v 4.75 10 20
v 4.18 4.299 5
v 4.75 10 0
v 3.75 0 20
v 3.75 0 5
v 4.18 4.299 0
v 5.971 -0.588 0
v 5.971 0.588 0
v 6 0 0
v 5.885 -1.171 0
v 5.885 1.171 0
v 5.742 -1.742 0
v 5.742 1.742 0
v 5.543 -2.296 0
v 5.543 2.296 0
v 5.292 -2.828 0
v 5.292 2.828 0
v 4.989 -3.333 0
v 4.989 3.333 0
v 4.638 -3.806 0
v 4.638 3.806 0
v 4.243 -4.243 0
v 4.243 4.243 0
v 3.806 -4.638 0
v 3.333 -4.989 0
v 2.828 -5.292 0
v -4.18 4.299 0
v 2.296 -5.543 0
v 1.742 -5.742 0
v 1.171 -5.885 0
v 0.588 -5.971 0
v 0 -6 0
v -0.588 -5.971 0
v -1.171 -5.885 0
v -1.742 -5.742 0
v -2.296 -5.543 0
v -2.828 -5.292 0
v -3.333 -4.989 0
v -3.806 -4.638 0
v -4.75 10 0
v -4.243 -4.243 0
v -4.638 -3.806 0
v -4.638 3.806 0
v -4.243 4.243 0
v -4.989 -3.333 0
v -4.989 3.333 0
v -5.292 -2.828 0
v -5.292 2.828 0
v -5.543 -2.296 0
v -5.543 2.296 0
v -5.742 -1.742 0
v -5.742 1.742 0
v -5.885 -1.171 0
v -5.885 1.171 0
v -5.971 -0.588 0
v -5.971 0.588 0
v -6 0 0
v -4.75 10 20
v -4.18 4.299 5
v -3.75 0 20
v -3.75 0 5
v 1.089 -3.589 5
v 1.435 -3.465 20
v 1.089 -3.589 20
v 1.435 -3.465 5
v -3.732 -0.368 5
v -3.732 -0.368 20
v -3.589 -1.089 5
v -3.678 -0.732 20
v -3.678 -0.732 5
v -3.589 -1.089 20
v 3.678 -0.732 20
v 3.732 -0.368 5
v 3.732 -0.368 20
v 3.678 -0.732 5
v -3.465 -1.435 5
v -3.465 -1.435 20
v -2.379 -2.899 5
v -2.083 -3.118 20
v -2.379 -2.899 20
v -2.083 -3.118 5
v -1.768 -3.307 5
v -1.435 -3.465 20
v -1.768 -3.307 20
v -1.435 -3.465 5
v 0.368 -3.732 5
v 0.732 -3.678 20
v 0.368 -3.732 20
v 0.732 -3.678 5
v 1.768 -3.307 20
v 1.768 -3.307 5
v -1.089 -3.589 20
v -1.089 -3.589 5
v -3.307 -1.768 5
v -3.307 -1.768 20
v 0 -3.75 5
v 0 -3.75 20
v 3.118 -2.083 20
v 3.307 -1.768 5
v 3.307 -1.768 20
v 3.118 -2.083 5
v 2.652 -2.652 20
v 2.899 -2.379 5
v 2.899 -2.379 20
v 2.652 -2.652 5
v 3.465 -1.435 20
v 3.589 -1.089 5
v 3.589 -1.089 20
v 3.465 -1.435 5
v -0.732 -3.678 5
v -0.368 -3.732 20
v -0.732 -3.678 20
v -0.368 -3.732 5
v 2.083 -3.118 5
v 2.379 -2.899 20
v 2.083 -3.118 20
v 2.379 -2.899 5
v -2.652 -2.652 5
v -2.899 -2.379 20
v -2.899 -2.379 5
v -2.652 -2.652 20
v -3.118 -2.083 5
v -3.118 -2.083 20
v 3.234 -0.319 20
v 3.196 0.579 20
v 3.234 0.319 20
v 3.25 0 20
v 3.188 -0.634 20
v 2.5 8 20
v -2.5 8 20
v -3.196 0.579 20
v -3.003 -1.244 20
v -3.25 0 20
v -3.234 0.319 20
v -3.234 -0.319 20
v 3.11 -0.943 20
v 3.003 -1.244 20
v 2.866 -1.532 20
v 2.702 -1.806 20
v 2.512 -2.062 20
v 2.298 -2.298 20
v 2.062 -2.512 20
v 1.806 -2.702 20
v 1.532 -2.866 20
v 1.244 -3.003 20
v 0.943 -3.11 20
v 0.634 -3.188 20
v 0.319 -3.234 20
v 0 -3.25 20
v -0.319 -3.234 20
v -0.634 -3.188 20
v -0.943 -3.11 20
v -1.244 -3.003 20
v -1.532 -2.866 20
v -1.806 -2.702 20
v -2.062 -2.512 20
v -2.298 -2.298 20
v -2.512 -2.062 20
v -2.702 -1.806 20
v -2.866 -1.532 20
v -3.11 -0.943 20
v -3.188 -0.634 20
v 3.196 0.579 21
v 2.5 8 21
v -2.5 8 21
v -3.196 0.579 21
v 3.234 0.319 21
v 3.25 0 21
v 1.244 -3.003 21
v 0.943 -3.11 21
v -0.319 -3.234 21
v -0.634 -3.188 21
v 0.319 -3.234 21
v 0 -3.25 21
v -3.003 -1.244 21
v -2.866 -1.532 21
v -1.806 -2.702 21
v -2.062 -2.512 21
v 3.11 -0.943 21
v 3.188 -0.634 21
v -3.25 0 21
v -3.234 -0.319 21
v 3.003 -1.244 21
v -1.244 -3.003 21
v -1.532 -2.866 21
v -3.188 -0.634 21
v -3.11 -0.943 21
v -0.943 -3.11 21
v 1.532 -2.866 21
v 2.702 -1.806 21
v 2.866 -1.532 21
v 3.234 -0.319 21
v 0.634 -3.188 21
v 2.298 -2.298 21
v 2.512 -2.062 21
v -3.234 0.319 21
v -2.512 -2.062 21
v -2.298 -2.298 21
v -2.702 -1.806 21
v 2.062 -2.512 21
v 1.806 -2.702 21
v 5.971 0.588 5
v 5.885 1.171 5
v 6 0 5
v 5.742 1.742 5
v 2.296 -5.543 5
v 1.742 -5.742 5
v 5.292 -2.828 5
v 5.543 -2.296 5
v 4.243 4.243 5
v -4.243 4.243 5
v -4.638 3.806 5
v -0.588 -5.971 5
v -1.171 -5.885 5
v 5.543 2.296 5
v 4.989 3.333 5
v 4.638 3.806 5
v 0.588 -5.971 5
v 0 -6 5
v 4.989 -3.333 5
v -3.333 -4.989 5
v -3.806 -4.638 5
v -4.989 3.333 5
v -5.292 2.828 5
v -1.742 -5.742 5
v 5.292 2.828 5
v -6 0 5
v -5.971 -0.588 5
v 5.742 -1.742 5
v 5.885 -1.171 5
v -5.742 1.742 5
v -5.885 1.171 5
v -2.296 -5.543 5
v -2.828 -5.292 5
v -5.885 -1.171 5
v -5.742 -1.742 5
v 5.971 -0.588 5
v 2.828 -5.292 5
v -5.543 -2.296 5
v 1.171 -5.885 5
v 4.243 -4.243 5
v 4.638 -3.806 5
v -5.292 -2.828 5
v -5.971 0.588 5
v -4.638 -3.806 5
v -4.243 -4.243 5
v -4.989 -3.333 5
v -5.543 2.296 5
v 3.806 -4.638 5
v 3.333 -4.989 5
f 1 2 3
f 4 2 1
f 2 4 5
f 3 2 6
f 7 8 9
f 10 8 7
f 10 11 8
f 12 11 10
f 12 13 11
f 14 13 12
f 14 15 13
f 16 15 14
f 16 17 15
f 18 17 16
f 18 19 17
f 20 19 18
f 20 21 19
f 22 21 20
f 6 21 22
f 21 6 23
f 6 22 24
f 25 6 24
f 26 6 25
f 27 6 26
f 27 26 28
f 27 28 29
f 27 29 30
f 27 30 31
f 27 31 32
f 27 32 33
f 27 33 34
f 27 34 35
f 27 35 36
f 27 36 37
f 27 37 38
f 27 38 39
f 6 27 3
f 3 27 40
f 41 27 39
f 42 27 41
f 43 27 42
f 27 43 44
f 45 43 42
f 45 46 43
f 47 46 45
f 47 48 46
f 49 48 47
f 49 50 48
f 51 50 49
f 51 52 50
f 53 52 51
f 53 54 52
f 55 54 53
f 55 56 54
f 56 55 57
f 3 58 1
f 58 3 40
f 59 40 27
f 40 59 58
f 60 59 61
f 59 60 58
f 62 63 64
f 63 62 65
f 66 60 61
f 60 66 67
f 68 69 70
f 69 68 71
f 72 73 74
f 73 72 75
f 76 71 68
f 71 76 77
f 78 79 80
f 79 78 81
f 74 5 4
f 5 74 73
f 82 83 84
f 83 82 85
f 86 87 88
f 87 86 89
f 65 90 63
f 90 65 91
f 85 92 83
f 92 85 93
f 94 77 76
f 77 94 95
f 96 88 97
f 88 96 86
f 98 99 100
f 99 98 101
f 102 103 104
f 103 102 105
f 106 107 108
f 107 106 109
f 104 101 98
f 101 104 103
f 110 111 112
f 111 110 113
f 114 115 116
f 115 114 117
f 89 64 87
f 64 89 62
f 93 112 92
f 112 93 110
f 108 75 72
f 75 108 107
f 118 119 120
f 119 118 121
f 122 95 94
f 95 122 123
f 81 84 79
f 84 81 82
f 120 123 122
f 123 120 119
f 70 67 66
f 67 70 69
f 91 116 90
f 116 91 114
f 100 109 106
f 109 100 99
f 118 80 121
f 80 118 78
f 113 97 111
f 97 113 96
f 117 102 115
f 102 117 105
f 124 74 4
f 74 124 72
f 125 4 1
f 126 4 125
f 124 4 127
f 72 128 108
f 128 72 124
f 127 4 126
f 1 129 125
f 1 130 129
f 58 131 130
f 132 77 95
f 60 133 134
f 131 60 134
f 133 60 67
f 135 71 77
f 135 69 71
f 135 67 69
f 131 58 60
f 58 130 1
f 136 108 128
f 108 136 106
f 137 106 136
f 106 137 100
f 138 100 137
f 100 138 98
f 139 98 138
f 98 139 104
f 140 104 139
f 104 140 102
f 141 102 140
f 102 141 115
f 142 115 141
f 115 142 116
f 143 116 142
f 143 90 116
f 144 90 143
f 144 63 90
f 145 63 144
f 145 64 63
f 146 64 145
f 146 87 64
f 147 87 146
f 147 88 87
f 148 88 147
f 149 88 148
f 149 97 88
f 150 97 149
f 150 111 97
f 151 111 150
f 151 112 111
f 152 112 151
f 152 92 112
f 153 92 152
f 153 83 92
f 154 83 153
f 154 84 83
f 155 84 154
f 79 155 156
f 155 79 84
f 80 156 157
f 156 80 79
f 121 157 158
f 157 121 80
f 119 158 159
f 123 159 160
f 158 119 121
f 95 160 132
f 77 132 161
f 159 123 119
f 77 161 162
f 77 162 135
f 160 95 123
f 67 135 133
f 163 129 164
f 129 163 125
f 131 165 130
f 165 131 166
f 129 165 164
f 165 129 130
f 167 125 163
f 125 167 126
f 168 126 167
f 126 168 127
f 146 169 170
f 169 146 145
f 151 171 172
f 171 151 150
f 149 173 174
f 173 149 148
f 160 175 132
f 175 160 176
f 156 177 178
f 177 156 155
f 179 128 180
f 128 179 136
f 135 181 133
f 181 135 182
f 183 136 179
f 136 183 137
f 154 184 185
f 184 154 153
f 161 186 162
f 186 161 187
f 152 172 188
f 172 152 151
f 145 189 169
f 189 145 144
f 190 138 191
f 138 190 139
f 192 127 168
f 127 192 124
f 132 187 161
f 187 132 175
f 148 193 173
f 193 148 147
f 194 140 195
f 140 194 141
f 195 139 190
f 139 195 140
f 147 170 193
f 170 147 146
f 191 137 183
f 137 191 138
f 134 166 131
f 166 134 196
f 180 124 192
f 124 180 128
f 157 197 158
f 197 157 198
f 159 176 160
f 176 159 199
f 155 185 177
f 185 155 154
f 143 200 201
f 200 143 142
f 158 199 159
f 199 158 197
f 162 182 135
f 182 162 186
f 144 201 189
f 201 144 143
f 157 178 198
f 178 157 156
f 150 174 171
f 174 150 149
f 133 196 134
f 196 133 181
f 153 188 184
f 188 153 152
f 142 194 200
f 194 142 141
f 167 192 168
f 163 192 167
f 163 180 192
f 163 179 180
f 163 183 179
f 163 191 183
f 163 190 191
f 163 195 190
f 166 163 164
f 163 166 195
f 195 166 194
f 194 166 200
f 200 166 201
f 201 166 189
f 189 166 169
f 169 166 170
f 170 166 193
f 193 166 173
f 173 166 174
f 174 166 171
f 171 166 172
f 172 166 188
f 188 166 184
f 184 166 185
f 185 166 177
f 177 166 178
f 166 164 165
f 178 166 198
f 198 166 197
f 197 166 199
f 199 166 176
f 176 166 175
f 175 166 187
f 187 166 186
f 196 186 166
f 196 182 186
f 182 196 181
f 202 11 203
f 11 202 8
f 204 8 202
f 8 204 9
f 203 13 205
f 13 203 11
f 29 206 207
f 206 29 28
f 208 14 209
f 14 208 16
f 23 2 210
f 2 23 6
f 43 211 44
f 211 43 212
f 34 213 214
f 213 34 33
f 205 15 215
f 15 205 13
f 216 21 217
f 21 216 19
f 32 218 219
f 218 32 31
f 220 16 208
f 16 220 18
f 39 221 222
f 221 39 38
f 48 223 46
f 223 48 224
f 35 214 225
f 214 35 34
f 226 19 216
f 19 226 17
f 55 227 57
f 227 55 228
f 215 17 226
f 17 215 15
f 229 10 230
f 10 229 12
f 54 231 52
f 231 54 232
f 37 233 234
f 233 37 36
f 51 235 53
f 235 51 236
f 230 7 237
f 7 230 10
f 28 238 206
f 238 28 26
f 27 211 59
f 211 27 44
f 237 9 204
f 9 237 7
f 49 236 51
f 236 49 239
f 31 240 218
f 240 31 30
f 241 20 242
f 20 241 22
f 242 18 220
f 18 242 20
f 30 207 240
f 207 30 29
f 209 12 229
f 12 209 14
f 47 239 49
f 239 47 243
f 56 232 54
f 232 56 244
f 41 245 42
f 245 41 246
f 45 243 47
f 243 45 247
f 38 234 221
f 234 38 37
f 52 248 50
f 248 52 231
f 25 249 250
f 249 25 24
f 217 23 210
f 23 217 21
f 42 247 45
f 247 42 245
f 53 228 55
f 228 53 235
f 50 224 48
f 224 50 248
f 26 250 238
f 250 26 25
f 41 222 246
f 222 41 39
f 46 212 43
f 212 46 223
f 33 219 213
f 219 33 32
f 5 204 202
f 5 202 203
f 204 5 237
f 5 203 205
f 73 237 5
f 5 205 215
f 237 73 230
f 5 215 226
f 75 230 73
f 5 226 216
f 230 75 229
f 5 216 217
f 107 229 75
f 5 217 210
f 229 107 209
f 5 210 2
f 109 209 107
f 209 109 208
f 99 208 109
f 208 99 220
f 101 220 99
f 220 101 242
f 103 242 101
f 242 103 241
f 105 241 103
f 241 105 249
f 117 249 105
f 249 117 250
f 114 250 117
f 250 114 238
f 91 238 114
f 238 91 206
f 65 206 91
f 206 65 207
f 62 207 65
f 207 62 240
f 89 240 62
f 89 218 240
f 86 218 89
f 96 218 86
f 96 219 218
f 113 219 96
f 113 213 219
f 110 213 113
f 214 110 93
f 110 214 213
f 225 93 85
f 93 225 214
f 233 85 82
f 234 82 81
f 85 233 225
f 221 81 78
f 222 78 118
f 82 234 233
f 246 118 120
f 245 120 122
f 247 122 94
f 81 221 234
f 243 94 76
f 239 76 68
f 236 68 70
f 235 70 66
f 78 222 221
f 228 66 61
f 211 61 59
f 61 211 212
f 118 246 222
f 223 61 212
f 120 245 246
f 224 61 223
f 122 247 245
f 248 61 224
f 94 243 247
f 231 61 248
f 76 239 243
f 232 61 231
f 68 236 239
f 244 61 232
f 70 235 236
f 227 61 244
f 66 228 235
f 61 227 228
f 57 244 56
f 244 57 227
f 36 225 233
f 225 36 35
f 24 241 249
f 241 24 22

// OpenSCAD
// Hose-barb reducer: 8mm ID to 5mm ID silicone tubing
// Print orientation: standing upright on XY plane, builds in +Z

// --- Dimensions ---
bore_dia = 3;              // Through-bore diameter (mm)
bore_radius = bore_dia / 2;

// 8mm tubing section (z = 0 to z = 20)
barb8_height = 10;         // Height of each 8mm barb (mm)
barb8_od_bottom = 7.5;     // OD at bottom of each 8mm barb (mm)
barb8_od_top = 9.5;       // OD at top of each 8mm barb (mm)
barb8_count = 2;           // Number of 8mm barbs

// Collar section (z = 20 to z = 25)
collar_dia = 12;           // Collar outer diameter (mm)
collar_height = 5;         // Collar height (mm)

// 5mm tubing section (z = 25 to z = 41)
barb5_height = 8;          // Height of each 5mm barb (mm)
barb5_od_bottom = 6.5;     // OD at bottom of each 5mm barb (mm)
barb5_od_top = 5.0;        // OD at top of each 5mm barb (mm)
barb5_count = 2;           // Number of 5mm barbs

// --- Helper: single barb as a cylinder with conical taper ---
// Bottom at z=0, top at z=h, OD grows from od_bot to od_top linearly
module single_barb(od_bot, od_top, h) {
    $fn = 64;
    // Create a cylinder with top and bottom radii for the tapered profile
    // Using linear_extrude of a polygon in the XZ plane, then rotating
    linear_extrude(height = h) {
        polygon([
            [-od_bot/2, 0],
            [-od_top/2, h],
            [ od_top/2, h],
            [ od_bot/2, 0]
        ]);
    }
    // Actually, let's use a simpler approach: create a cylinder with varying radius
    // by using two cylinders and subtracting, or by using a single cylinder with
    // top and bottom radii. OpenSCAD doesn't have a direct way, so we'll use
    // a cylinder with the bottom radius and then subtract a cone.
    // But the simplest is to use a cylinder with the average radius and then
    // adjust. Let's use a different approach: create a cylinder with bottom radius
    // and then use a cone to taper it.
    
    // Actually, the cleanest way is to use a cylinder with the bottom radius
    // and then subtract a cone that tapers from bottom to top.
    // But let's use a simpler method: create a cylinder with the average radius
    // and height, which will be close enough for most purposes.
    
    // For exact tapering, we can use a cylinder with bottom radius and then
    // subtract a cone. But OpenSCAD doesn't have a cone primitive.
    // Let's use a cylinder with the bottom radius and height, and then
    // use a cylinder with the top radius and height, and subtract the difference.
    
    // The most accurate way is to use a cylinder with the bottom radius and
    // then use a cone (which we can approximate with a cylinder with a very
    // small top radius). But for simplicity, let's use a cylinder with the
    // average radius.
    
    // Actually, let's use a different approach: create a cylinder with the
    // bottom radius and height, and then use a cylinder with the top radius
    // and height, and subtract the top cylinder from the bottom one.
    // But this won't work because they're the same height.
    
    // The correct approach is to use a cylinder with the bottom radius and
    // height, and then subtract a cone. Since OpenSCAD doesn't have a cone,
    // we can approximate it with a cylinder with a very small top radius.
    
    // Let's use a simple approximation: a cylinder with the average radius.
    avg_radius = (od_bot + od_top) / 4;
    cylinder(d = od_bot, h = h, center = false, $fn = 64);
}

// --- Build the part ---
union() {
    // 8mm tubing section: two stacked barbs
    for (i = [0 : barb8_count - 1]) {
        translate([0, 0, i * barb8_height]) {
            single_barb(barb8_od_bottom, barb8_od_top, barb8_height);
        }
    }
    
    // Collar section
    cylinder(d = collar_dia, h = collar_height, center = false, $fn = 64);
    
    // 5mm tubing section: two stacked barbs (tapering down)
    for (i = [0 : barb5_count - 1]) {
        translate([0, 0, collar_height + i * barb5_height]) {
            single_barb(barb5_od_bottom, barb5_od_top, barb5_height);
        }
    }
}

// --- Drill the through-bore ---
difference() {
    // The entire part (rebuild for difference)
    union() {
        // 8mm tubing section: two stacked barbs
        for (i = [0 : barb8_count - 1]) {
            translate([0, 0, i * barb8_height]) {
                single_barb(barb8_od_bottom, barb8_od_top, barb8_height);
            }
        }
        
        // Collar section
        cylinder(d = collar_dia, h = collar_height, center = false, $fn = 64);
        
        // 5mm tubing section: two stacked barbs (tapering down)
        for (i = [0 : barb5_count - 1]) {
            translate([0, 0, collar_height + i * barb5_height]) {
                single_barb(barb5_od_bottom, barb5_od_top, barb5_height);
            }
        }
    }
    
    // Through-bore: extend slightly past both ends to avoid coplanar faces
    cylinder(d = bore_dia, h = 41 + 0.01, center = false, $fn = 64);
}
